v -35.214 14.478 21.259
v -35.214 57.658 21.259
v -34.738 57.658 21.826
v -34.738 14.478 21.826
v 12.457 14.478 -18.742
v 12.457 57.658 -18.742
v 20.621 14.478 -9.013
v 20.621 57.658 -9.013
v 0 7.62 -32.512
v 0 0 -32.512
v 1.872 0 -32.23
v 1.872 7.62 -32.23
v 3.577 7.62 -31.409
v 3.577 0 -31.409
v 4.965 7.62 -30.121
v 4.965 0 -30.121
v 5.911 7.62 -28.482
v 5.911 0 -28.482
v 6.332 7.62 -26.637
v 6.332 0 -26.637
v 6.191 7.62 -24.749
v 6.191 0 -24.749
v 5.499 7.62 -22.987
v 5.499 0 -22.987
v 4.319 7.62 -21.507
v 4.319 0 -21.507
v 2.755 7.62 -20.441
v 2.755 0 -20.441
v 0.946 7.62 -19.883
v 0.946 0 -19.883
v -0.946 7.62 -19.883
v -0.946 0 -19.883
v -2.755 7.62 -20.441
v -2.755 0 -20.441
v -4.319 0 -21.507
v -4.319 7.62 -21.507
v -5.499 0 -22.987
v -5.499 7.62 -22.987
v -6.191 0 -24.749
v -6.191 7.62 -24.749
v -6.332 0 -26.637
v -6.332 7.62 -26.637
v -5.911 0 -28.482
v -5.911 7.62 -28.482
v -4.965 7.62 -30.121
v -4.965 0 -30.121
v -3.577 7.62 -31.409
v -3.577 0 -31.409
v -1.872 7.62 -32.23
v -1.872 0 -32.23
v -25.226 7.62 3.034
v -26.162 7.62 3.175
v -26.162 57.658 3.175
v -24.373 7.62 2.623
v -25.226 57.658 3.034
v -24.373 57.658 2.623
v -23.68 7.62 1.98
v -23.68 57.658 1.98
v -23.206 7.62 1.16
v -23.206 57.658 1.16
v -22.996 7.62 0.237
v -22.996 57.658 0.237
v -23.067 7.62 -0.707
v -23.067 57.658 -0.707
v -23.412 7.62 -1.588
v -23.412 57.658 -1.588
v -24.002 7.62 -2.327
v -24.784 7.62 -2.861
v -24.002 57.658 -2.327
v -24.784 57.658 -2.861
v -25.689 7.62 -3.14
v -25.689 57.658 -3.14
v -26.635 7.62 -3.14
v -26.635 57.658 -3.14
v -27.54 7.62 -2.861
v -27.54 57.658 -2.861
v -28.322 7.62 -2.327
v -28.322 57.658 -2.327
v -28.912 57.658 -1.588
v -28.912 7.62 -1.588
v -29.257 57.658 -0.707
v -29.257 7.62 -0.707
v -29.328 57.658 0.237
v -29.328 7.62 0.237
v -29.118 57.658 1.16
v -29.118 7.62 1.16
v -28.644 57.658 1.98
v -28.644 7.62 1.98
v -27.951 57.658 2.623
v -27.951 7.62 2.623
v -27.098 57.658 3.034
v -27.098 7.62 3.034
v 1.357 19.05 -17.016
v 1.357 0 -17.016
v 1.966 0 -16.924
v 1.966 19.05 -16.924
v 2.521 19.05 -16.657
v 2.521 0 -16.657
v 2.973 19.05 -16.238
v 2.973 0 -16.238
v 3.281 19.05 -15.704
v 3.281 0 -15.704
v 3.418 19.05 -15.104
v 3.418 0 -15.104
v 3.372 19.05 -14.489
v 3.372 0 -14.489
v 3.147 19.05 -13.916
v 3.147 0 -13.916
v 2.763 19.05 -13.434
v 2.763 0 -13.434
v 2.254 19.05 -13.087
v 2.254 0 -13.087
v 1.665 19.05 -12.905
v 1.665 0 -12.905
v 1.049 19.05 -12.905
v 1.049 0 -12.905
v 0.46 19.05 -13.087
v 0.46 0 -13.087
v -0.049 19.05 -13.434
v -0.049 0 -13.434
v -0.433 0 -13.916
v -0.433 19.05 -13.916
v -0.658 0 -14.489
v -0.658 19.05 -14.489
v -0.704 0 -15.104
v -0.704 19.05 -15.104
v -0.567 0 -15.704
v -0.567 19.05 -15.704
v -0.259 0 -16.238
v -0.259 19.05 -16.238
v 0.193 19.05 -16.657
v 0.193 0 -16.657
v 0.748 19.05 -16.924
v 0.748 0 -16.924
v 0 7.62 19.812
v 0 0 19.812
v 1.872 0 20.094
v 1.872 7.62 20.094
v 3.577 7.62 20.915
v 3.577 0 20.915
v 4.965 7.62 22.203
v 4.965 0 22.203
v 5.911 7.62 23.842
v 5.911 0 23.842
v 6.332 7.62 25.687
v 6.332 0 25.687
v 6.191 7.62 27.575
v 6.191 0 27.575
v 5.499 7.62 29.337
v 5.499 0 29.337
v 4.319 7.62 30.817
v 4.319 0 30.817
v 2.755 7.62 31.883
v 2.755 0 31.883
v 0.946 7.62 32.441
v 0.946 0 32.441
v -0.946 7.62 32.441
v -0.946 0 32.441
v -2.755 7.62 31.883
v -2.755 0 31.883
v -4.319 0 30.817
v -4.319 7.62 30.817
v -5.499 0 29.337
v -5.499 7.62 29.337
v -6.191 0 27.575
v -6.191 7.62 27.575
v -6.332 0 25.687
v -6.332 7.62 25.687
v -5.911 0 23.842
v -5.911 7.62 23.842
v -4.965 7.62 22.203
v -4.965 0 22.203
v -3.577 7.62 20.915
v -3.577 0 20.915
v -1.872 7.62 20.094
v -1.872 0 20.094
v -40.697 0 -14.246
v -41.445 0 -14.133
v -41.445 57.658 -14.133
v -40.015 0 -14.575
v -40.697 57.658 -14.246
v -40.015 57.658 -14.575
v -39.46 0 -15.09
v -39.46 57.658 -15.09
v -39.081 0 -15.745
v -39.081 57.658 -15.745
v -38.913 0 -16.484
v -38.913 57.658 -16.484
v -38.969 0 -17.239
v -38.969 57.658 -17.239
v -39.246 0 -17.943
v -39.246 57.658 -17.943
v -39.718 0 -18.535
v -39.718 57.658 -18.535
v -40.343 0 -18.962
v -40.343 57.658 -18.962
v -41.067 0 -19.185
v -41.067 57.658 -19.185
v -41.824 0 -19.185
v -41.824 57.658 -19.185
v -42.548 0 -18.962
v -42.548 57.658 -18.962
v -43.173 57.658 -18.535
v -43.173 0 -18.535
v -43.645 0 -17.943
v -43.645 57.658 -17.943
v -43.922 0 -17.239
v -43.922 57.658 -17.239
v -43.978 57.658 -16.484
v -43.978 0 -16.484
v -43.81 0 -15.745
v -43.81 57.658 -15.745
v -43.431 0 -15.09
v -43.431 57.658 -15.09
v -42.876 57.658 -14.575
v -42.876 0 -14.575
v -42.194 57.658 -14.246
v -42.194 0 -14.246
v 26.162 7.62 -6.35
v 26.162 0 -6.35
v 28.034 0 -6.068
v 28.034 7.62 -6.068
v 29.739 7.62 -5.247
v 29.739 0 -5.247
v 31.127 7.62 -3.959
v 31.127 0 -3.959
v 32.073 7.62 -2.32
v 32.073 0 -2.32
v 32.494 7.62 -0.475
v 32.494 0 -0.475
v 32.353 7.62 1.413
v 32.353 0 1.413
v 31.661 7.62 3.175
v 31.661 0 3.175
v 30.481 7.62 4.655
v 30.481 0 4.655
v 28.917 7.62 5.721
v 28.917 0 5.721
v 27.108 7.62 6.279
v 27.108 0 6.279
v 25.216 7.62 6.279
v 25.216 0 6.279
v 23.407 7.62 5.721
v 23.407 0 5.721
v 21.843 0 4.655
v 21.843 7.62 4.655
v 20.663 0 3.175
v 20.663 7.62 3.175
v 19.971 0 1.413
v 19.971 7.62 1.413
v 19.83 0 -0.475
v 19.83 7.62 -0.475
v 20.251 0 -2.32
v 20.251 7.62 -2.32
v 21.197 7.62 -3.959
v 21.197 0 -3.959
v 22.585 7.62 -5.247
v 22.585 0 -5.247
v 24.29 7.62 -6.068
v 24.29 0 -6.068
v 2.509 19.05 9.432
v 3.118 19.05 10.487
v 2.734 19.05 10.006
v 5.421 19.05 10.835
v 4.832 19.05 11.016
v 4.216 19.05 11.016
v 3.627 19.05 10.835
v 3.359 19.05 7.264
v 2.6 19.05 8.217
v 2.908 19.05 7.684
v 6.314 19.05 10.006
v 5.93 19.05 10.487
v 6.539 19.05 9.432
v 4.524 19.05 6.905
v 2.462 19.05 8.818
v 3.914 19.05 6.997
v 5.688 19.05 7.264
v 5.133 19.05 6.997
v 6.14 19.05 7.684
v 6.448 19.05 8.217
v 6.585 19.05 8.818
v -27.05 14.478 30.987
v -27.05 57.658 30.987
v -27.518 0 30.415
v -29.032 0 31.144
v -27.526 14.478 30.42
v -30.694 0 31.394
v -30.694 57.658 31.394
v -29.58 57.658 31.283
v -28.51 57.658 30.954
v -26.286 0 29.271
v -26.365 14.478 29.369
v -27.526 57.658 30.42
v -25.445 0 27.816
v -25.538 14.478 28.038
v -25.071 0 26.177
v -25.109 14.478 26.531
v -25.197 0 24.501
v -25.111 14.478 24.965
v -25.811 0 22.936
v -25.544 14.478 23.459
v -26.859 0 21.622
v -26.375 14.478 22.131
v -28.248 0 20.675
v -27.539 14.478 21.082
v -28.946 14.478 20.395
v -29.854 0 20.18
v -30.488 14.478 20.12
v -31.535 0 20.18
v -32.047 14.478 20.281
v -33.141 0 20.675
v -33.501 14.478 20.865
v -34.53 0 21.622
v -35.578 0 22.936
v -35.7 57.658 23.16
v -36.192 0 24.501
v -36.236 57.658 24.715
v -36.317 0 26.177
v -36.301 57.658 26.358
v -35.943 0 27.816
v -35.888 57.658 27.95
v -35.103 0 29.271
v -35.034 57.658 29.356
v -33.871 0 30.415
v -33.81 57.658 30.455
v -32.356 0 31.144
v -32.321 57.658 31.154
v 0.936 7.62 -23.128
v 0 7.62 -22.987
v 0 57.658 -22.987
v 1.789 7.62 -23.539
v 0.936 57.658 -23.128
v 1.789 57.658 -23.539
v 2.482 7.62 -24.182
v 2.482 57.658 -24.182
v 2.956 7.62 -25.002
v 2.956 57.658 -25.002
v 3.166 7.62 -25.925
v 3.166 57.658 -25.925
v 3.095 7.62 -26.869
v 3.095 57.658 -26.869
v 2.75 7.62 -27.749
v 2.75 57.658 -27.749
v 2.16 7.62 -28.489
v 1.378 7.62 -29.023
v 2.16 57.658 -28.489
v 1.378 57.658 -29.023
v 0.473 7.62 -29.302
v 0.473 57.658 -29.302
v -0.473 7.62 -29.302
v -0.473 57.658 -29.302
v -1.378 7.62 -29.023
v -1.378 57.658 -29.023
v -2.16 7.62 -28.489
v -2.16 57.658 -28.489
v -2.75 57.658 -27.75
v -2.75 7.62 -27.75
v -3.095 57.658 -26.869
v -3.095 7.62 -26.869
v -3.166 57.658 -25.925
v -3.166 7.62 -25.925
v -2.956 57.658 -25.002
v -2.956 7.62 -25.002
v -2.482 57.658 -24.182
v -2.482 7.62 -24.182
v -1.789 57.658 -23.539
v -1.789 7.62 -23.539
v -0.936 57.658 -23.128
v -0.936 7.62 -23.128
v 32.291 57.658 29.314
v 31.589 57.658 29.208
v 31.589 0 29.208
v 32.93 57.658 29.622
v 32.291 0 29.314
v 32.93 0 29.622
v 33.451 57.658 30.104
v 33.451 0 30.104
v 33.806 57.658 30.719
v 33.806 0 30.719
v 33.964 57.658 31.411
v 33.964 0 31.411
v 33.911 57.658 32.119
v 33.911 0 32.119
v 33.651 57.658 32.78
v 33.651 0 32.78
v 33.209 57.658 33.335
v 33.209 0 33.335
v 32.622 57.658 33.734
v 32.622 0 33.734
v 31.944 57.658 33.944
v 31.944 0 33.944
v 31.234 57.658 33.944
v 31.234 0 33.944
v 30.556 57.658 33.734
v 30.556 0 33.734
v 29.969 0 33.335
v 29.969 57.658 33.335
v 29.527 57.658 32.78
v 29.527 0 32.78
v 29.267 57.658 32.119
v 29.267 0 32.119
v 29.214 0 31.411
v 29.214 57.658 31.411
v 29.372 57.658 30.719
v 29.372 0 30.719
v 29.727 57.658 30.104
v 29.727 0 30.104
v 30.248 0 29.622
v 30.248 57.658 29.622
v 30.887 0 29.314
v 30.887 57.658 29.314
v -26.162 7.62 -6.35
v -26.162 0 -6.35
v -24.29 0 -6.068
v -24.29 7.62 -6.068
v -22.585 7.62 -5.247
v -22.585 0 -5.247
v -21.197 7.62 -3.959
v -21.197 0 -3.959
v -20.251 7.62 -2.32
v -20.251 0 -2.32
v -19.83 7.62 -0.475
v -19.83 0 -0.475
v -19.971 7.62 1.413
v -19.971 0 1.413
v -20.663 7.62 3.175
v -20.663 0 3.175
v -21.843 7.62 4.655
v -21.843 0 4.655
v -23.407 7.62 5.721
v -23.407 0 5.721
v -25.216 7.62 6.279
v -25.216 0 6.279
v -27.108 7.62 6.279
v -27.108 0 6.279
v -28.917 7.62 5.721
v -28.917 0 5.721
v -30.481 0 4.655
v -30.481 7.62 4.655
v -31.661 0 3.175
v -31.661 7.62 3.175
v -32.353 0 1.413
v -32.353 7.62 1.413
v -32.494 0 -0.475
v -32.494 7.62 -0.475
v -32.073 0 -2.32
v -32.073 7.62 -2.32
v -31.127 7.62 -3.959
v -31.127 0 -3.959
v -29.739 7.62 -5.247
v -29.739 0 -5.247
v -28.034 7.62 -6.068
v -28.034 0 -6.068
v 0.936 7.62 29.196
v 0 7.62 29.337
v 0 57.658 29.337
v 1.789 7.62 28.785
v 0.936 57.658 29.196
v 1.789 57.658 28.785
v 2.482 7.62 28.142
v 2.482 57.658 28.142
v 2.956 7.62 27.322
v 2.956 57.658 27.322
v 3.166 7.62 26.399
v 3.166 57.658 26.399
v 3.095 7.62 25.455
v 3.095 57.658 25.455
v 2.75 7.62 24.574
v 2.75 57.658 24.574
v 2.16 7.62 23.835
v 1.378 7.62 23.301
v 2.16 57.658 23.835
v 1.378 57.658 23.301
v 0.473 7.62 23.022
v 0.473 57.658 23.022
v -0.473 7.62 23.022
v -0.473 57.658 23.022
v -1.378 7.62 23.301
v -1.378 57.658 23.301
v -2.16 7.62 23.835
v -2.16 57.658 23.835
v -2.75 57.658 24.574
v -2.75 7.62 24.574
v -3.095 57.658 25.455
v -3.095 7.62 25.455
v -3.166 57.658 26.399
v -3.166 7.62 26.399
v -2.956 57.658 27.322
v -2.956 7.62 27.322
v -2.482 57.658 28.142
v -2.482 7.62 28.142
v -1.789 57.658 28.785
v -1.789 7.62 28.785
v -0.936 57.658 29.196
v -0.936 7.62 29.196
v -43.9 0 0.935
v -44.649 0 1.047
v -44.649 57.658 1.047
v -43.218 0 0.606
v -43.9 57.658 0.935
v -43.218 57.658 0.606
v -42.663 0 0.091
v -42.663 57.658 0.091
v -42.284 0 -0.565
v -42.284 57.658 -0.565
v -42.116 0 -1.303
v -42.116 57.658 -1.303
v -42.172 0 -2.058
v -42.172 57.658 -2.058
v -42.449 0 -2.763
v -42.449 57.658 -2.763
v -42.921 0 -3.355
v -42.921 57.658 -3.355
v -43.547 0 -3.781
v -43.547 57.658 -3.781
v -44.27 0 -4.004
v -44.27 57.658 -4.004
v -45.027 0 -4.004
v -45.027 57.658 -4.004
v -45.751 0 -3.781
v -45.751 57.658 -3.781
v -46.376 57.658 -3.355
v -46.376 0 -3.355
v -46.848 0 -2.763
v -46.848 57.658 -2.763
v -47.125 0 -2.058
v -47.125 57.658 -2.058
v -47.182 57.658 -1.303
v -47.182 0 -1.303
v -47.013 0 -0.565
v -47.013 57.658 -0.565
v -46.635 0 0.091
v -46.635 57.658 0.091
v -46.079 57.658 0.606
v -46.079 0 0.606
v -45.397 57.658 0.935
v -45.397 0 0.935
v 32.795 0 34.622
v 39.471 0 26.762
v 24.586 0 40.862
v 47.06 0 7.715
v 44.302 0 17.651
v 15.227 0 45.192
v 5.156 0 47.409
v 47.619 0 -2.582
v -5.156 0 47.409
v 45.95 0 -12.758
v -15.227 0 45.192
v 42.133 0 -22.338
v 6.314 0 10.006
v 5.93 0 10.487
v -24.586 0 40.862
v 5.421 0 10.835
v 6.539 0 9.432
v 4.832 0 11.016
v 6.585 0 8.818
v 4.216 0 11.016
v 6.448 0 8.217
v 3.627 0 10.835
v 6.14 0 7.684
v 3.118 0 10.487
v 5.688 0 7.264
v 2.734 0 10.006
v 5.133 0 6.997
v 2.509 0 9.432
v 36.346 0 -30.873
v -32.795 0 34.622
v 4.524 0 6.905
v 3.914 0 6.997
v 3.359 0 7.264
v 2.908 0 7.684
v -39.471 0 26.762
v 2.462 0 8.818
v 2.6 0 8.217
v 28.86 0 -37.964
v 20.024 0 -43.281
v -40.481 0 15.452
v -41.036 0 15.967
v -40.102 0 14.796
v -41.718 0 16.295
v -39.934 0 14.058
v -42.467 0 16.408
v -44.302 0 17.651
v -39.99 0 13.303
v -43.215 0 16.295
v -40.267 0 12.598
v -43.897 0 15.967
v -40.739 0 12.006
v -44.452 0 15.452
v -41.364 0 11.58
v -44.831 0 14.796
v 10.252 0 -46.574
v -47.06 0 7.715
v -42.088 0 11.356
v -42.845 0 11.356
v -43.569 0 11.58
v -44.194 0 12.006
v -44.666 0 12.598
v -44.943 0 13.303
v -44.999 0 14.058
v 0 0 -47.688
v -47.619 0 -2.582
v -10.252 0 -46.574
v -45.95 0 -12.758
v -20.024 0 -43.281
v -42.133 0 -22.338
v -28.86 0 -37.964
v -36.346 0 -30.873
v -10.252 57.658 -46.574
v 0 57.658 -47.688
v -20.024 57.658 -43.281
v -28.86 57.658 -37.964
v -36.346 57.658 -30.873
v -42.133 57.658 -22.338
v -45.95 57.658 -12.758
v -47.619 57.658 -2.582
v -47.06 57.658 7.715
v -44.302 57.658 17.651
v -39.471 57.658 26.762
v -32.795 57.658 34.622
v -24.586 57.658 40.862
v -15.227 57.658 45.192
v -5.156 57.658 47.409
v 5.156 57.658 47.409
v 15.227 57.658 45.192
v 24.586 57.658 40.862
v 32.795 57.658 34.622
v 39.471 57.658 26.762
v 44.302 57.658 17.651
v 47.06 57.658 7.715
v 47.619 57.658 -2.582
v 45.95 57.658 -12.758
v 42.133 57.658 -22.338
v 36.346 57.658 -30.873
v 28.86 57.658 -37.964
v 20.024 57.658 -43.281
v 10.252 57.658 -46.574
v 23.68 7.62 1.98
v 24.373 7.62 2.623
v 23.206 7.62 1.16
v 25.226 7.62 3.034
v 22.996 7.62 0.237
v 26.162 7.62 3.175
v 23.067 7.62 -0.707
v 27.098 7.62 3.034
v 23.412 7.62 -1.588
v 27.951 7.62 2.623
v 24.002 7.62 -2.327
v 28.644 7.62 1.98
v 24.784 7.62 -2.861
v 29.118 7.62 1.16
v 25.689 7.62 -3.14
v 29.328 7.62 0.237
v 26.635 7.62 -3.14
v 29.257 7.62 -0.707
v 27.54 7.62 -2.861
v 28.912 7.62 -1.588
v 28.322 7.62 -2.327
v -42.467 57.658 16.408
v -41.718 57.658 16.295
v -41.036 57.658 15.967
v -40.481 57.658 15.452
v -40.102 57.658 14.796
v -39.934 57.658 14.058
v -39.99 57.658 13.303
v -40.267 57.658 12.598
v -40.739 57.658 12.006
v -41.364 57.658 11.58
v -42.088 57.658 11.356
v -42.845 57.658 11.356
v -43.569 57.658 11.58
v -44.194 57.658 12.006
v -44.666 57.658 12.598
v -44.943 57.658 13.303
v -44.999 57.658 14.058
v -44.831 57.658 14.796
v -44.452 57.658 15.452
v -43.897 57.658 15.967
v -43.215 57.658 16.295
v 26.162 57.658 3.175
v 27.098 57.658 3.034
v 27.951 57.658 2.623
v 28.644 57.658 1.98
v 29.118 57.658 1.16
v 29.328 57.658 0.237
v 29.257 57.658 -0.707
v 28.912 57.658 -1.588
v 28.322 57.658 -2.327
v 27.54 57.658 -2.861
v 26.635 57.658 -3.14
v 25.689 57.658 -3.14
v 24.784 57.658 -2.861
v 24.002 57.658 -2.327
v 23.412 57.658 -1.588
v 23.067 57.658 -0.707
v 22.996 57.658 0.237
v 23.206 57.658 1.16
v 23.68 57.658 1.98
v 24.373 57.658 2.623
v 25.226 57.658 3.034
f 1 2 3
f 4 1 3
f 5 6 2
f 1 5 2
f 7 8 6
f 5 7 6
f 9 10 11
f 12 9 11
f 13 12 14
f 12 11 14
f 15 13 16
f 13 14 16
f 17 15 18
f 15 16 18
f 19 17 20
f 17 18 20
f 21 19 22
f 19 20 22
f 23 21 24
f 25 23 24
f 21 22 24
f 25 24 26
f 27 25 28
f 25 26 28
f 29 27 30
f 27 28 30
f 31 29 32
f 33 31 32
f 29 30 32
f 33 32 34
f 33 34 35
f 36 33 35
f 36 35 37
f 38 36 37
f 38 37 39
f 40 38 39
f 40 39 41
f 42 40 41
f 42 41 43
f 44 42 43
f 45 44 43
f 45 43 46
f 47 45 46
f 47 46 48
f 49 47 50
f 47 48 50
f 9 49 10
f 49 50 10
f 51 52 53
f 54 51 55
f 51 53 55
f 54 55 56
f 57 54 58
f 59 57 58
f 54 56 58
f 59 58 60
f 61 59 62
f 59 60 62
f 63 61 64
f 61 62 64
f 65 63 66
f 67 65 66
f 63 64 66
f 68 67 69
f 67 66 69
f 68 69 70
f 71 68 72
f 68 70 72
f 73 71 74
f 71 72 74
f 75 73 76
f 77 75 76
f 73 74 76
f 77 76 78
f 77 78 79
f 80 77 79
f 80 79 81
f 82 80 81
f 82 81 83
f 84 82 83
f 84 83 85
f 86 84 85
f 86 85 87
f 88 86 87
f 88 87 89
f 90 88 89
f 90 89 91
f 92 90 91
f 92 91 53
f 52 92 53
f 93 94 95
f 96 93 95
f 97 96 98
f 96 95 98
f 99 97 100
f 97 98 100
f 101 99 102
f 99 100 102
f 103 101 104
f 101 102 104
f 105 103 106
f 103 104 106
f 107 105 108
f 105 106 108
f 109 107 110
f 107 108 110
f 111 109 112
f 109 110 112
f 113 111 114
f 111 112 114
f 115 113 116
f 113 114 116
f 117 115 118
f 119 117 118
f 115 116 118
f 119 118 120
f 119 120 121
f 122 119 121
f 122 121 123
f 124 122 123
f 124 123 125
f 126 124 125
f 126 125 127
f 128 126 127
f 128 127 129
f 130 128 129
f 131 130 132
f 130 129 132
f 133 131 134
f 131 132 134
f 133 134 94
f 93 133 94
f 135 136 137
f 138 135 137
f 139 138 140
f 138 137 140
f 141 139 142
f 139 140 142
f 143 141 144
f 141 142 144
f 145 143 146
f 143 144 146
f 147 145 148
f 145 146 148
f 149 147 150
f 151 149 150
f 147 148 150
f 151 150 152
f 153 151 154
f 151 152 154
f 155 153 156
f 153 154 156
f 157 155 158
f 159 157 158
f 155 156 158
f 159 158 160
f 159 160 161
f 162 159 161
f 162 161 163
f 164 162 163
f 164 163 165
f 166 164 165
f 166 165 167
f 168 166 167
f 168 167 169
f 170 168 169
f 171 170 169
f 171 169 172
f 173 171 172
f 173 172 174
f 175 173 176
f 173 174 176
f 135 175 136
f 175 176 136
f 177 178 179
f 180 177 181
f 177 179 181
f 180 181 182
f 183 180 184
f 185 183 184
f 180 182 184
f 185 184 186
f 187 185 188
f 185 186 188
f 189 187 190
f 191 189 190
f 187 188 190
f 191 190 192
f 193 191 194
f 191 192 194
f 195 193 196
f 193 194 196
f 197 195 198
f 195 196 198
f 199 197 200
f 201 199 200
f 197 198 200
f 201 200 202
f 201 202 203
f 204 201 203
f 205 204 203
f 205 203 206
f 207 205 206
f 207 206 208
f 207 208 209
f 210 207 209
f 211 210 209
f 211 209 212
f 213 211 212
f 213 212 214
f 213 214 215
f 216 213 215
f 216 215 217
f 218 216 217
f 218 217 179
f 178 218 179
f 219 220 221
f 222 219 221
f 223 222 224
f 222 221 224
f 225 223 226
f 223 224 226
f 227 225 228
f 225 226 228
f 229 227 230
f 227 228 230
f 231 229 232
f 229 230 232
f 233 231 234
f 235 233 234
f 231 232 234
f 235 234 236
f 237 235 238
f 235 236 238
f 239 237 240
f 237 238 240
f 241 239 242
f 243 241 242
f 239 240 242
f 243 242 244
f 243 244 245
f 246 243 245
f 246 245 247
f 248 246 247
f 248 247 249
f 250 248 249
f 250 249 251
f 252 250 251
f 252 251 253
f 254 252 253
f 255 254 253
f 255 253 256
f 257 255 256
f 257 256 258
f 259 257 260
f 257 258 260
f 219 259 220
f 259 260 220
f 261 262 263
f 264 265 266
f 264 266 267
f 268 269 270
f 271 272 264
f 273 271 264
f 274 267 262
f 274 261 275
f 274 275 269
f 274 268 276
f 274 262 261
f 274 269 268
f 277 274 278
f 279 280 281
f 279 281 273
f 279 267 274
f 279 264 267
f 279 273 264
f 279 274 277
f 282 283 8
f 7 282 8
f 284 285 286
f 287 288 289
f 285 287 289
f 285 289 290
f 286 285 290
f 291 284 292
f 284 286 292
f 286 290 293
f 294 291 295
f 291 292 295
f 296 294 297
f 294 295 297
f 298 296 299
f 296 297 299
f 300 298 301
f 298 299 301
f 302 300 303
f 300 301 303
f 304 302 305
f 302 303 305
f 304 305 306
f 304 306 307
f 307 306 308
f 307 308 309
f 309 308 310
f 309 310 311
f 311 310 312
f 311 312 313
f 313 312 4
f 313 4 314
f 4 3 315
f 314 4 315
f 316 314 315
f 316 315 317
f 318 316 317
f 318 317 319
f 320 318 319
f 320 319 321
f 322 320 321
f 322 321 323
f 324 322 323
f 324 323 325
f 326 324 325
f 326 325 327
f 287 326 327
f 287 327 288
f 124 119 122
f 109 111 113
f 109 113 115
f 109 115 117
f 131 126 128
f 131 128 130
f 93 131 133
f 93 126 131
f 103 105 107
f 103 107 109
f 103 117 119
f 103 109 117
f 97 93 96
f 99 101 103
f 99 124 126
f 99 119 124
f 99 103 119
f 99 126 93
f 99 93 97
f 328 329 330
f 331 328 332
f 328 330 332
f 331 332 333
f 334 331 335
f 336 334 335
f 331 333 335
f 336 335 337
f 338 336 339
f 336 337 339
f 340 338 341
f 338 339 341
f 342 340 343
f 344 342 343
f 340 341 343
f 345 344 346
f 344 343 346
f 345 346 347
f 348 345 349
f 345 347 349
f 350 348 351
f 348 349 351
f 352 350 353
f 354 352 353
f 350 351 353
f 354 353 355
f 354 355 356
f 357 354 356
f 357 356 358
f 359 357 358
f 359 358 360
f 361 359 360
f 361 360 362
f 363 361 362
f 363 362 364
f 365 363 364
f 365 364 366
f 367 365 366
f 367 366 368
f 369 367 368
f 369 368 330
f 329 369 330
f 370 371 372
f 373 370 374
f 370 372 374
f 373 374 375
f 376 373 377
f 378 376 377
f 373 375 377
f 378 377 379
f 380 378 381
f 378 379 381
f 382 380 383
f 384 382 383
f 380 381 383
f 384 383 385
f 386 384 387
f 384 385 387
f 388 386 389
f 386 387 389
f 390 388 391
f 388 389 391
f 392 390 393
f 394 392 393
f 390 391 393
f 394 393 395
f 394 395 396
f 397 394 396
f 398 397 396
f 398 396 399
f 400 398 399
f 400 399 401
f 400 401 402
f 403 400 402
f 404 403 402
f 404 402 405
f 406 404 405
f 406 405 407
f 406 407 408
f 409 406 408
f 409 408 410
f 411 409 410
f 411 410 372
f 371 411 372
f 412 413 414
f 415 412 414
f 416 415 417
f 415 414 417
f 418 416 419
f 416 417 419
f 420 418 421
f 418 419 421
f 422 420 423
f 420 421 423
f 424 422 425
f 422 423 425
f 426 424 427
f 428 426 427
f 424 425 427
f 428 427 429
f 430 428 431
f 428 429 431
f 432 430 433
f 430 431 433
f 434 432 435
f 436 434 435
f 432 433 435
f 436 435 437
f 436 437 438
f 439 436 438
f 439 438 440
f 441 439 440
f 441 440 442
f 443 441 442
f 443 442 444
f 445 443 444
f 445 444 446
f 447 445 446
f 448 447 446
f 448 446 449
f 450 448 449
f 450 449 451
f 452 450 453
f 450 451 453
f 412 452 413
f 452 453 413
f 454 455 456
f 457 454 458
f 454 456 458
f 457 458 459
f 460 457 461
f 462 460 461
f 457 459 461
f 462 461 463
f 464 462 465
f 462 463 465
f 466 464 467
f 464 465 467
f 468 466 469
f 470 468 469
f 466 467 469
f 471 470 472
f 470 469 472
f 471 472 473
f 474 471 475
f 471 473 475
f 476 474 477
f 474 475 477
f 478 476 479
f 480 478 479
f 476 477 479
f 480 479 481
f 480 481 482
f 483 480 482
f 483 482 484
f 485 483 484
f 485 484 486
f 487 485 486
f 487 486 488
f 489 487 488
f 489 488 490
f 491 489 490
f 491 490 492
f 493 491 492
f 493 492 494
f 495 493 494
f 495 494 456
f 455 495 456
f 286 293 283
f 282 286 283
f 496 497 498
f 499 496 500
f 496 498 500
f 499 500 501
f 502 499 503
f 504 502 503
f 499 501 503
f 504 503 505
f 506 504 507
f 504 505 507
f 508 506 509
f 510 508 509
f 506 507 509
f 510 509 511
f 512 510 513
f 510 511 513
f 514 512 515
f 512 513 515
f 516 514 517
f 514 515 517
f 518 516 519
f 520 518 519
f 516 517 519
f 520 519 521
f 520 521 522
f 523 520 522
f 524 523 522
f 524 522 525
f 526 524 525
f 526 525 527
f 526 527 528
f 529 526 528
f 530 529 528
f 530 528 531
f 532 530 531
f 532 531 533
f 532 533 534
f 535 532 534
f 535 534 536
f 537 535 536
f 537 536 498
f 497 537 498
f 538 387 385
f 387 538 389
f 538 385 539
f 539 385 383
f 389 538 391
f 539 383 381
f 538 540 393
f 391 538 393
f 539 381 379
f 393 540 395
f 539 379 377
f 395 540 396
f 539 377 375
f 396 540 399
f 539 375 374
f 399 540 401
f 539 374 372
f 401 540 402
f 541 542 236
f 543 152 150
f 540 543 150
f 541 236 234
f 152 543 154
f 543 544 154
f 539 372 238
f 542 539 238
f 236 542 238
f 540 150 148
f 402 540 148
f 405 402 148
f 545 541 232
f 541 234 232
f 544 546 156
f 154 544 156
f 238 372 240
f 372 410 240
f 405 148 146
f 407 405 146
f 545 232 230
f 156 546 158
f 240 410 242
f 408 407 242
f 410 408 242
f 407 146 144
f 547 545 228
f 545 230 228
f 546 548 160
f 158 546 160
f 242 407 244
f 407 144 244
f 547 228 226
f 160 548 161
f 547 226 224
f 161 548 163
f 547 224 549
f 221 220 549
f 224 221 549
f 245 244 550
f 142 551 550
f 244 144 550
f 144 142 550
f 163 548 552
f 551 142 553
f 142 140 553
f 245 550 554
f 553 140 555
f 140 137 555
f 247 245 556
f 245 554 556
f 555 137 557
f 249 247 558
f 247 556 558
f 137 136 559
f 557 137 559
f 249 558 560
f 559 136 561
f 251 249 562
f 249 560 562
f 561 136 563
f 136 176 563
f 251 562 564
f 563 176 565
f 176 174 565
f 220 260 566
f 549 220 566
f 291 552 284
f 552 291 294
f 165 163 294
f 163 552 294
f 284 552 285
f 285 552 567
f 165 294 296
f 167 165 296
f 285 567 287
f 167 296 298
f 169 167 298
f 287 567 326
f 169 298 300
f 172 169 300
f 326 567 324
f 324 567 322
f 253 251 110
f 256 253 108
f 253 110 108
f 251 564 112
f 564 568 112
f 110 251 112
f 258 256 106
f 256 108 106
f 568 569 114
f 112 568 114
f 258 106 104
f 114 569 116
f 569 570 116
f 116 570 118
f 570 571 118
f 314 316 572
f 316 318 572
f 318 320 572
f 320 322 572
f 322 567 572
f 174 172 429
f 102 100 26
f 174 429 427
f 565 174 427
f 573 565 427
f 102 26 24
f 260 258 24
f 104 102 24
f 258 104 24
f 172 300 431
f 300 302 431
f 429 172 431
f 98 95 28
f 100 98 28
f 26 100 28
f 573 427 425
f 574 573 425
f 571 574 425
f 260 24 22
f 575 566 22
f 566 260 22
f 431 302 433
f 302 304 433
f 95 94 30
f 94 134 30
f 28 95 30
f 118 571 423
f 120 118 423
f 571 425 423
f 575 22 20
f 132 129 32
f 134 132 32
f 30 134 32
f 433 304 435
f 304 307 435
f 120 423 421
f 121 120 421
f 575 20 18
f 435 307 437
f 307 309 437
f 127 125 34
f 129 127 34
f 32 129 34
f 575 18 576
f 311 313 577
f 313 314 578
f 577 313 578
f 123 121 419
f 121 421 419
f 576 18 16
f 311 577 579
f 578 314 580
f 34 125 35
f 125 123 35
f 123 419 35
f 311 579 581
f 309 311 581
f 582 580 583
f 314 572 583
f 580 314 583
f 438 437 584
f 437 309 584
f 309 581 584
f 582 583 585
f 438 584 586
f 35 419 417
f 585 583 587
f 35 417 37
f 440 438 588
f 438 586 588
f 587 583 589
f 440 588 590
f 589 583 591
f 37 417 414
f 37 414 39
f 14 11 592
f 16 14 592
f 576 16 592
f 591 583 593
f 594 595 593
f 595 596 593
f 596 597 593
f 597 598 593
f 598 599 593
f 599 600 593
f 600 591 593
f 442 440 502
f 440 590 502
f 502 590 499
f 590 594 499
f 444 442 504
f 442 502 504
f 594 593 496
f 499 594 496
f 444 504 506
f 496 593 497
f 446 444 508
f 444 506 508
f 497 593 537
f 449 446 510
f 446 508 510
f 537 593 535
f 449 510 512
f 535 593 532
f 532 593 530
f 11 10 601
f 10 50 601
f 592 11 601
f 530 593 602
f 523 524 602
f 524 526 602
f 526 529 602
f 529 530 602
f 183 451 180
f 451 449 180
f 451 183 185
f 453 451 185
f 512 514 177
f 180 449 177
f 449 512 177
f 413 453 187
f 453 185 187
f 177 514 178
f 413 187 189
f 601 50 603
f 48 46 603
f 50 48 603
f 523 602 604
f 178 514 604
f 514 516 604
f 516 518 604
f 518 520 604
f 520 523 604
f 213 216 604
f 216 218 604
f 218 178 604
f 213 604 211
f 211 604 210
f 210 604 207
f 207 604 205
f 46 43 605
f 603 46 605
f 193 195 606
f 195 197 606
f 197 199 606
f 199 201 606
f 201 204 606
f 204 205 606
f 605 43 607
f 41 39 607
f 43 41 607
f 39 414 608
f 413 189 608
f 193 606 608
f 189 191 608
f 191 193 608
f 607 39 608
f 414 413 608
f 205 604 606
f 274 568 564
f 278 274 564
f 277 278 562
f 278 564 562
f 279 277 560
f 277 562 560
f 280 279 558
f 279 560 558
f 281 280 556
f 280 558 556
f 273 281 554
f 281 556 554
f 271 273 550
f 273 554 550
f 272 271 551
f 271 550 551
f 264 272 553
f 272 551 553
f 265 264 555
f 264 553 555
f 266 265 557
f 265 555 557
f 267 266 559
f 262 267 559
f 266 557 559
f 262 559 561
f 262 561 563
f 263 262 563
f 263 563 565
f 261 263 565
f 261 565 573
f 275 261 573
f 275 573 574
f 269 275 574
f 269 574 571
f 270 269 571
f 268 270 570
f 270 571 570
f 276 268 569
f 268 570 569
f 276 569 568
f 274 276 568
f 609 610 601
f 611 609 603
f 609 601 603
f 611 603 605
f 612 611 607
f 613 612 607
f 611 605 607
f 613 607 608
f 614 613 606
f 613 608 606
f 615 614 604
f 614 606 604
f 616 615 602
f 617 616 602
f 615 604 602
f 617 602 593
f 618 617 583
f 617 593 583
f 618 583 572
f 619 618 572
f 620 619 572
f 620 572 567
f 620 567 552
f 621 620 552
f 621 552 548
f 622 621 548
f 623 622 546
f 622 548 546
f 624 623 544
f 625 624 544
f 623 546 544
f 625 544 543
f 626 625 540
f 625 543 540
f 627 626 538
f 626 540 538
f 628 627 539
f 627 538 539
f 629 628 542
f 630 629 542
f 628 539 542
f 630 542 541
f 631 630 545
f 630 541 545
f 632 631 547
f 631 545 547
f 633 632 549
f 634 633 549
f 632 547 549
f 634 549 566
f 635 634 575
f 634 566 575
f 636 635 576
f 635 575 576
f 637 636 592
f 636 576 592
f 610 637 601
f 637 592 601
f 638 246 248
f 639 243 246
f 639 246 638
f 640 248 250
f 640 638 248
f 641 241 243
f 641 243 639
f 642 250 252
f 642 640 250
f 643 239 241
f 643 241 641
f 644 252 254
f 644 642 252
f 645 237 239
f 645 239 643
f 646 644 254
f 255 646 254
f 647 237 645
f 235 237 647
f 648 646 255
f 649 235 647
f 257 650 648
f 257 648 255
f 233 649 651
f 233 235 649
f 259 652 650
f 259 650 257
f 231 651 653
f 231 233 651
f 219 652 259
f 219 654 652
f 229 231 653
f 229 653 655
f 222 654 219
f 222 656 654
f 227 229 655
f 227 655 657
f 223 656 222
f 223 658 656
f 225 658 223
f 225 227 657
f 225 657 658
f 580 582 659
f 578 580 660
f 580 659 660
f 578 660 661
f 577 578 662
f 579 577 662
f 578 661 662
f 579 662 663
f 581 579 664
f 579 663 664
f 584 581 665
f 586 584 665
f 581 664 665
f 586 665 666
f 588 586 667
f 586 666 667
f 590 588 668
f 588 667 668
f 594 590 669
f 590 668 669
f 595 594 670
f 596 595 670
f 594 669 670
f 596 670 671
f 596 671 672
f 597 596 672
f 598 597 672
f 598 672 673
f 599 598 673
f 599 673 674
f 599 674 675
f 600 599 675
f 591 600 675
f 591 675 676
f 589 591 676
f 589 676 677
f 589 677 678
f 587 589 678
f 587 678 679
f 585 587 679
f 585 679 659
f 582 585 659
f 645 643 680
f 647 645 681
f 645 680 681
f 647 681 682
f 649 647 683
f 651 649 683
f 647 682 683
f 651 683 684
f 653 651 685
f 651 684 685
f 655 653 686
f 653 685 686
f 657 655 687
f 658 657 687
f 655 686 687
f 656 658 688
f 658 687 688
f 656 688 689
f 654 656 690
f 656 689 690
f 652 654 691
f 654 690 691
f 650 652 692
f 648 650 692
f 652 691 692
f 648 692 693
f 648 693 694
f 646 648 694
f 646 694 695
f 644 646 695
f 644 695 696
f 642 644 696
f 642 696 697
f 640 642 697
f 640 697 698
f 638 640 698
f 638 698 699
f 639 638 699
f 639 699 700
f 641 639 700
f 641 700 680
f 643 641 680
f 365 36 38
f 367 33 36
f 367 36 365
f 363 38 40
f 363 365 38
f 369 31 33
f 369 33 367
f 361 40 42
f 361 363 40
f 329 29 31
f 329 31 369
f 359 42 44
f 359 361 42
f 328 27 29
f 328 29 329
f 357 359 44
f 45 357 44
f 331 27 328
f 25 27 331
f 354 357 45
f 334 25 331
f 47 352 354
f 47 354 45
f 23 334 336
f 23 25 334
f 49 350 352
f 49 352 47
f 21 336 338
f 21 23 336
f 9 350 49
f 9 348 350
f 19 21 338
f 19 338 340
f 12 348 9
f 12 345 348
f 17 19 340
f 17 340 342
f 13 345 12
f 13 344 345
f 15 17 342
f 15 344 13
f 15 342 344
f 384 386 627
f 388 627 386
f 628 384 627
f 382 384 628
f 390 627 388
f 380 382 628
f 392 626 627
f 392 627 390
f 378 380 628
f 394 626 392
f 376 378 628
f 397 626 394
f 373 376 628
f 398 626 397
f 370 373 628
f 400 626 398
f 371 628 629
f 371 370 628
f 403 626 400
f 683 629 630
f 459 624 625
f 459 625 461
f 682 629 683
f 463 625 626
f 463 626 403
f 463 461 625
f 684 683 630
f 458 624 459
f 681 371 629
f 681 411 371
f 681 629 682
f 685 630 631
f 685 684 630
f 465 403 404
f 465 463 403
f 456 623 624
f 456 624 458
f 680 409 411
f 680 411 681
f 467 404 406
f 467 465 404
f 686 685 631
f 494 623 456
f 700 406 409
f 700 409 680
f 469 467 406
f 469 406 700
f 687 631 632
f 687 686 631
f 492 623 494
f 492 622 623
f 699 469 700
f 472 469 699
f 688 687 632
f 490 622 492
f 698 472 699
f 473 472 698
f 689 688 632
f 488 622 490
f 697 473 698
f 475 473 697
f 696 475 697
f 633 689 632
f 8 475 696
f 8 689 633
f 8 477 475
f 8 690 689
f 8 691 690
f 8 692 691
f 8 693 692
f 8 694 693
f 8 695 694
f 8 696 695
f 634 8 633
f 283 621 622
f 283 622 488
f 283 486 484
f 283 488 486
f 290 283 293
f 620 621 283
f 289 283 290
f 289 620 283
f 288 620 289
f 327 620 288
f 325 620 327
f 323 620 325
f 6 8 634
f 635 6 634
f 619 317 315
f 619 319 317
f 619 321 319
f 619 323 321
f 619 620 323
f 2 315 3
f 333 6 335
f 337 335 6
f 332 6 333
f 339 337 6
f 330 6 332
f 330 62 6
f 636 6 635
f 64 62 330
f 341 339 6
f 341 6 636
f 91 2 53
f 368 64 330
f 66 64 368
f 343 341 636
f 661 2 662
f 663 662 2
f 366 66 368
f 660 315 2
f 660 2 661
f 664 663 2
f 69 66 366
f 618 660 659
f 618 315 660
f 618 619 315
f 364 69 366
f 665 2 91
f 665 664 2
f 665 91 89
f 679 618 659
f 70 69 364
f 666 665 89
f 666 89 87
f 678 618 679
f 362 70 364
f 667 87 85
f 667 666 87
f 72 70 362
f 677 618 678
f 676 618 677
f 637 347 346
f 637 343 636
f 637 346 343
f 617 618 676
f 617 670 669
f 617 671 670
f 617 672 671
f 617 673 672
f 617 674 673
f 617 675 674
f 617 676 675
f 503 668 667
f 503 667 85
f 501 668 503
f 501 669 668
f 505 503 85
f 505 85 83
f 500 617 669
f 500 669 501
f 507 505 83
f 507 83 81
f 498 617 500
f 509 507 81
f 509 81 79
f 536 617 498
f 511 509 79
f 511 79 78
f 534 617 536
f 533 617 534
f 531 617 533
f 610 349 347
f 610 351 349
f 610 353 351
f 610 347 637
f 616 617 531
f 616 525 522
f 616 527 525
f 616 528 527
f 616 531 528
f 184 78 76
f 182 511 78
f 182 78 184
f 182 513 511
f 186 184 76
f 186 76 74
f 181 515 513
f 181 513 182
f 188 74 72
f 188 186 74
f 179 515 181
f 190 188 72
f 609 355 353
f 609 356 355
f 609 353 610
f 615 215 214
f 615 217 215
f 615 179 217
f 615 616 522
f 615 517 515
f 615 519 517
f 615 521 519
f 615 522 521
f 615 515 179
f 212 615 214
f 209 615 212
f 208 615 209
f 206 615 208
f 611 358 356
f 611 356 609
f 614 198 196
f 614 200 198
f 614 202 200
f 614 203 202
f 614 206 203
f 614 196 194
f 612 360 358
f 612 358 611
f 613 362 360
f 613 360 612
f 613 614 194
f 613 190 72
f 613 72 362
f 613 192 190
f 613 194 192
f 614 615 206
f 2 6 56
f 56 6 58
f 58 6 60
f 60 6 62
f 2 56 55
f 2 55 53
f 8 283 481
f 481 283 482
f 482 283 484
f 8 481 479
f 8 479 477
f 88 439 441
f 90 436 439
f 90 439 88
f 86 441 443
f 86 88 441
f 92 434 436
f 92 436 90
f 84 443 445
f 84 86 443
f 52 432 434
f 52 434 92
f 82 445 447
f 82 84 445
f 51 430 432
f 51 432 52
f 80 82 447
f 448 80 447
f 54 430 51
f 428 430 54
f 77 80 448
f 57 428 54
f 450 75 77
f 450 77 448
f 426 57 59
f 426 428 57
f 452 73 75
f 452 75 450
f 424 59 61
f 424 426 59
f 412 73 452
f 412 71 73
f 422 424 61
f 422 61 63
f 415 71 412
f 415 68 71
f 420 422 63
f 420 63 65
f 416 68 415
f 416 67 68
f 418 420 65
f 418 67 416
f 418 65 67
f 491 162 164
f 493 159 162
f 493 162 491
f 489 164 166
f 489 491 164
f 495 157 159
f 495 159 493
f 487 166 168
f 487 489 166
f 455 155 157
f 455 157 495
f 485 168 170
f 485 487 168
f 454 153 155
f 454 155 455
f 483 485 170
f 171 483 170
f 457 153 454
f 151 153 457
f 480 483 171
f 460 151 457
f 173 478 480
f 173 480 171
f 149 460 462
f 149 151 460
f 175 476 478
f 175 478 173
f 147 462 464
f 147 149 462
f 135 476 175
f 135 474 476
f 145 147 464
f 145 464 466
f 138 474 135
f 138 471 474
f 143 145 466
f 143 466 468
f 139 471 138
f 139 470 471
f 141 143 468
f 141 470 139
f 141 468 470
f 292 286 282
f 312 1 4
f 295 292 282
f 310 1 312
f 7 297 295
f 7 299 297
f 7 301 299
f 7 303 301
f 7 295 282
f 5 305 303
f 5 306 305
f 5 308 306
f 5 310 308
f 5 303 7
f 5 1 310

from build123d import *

# Parameters (mm, degrees)
SKETCH2_R           = 47.6885
BOSS_EXTRUDE1_DEPTH = 57.658
SKETCH5_R           = 2.54
SKETCH5_R_2         = 5.6388
CUT_EXTRUDE2_DEPTH  = 89.728975135
SKETCH4_R           = 3.175
CUT_EXTRUDE3_DEPTH  = 89.728975135
CUT_EXTRUDE4_DEPTH  = 43.18
SKETCH11_R          = 6.35
CUT_EXTRUDE7_DEPTH  = 7.62
SKETCH14_R          = 2.067000057
CUT_EXTRUDE8_DEPTH  = 19.05
SKETCH15_R          = 2.38125
CUT_EXTRUDE9_DEPTH  = 66.04


with BuildPart() as part:
    # Sketch2 → Boss-Extrude1 (new body)
    with BuildSketch(Plane(origin=(0, 0, 0), x_dir=(1, 0, 0), z_dir=(0, 1, 0))):
        with Locations(Location((0, 0, 0), (0, 0, 90))):
            Circle(SKETCH2_R)
    extrude(amount=BOSS_EXTRUDE1_DEPTH)

    # Sketch5 → Cut-Extrude2 (cut, through all)
    with BuildSketch(Plane(origin=(0, 57.658, 0), x_dir=(1, 0, 0), z_dir=(0, 1, 0))):
        with Locations(Location((-41.445499463, 16.673368884, 0), (0, 0, 270))):
            Circle(SKETCH5_R)
        with Locations(Location((-44.648658026, 1.492646038, 0), (0, 0, 270))):
            Circle(SKETCH5_R)
        with Locations(Location((-42.466529486, -13.86811195, 0), (0, 0, 270))):
            Circle(SKETCH5_R)
        with Locations(Location((-30.694251769, -25.755535339, 0), (0, 0, 270))):
            Circle(SKETCH5_R_2)
    extrude(amount=-CUT_EXTRUDE2_DEPTH, mode=Mode.SUBTRACT)

    # Sketch4 → Cut-Extrude3 (cut, through all)
    with BuildSketch(Plane(origin=(0, 57.658, 0), x_dir=(1, 0, 0), z_dir=(0, 1, 0))):
        with Locations(Location((-26.162, 0, 0), (0, 0, 270))):
            Circle(SKETCH4_R)
        with Locations(Location((26.162, 0, 0), (0, 0, 270))):
            Circle(SKETCH4_R)
        with Locations(Location((0, 26.162, 0), (0, 0, 270))):
            Circle(SKETCH4_R)
        with Locations(Location((0, -26.162, 0), (0, 0, 270))):
            Circle(SKETCH4_R)
    extrude(amount=-CUT_EXTRUDE3_DEPTH, mode=Mode.SUBTRACT)

    # Sketch6 → Cut-Extrude4 (cut)
    with BuildSketch(Plane(origin=(0, 57.658, 0), x_dir=(1, 0, 0), z_dir=(0, 1, 0))):
        Polygon((-27.050344847, -30.987270671), (20.620600848, 9.013402279), (12.457198205, 18.742166707), (-35.21374749, -21.258506244), align=None)
    extrude(amount=-CUT_EXTRUDE4_DEPTH, mode=Mode.SUBTRACT)

    # Sketch11 → Cut-Extrude7 (cut)
    with BuildSketch(Plane.XZ):
        with Locations(Location((0, 26.162, 0), (0, 0, 270))):
            Circle(SKETCH11_R)
        with Locations(Location((26.162, 0, 0), (0, 0, 270))):
            Circle(SKETCH11_R)
        with Locations(Location((0, -26.162, 0), (0, 0, 270))):
            Circle(SKETCH11_R)
        with Locations(Location((-26.162, 0, 0), (0, 0, 270))):
            Circle(SKETCH11_R)
    extrude(amount=-CUT_EXTRUDE7_DEPTH, mode=Mode.SUBTRACT)

    # Sketch14 → Cut-Extrude8 (cut)
    with BuildSketch(Plane.XZ):
        with Locations(Location((1.356935186, -14.949033782, 0), (0, 0, 270))):
            Circle(SKETCH14_R)
        with Locations(Location((4.523691953, 8.972265338, 0), (0, 0, 270))):
            Circle(SKETCH14_R)
    extrude(amount=-CUT_EXTRUDE8_DEPTH, mode=Mode.SUBTRACT)

    # Sketch15 → Cut-Extrude9 (cut)
    with BuildSketch(Plane.XZ):
        with Locations(Location((31.589006405, 31.589006405, 0), (0, 0, 270))):
            Circle(SKETCH15_R)
    extrude(amount=-CUT_EXTRUDE9_DEPTH, mode=Mode.SUBTRACT)


solid = part.part
